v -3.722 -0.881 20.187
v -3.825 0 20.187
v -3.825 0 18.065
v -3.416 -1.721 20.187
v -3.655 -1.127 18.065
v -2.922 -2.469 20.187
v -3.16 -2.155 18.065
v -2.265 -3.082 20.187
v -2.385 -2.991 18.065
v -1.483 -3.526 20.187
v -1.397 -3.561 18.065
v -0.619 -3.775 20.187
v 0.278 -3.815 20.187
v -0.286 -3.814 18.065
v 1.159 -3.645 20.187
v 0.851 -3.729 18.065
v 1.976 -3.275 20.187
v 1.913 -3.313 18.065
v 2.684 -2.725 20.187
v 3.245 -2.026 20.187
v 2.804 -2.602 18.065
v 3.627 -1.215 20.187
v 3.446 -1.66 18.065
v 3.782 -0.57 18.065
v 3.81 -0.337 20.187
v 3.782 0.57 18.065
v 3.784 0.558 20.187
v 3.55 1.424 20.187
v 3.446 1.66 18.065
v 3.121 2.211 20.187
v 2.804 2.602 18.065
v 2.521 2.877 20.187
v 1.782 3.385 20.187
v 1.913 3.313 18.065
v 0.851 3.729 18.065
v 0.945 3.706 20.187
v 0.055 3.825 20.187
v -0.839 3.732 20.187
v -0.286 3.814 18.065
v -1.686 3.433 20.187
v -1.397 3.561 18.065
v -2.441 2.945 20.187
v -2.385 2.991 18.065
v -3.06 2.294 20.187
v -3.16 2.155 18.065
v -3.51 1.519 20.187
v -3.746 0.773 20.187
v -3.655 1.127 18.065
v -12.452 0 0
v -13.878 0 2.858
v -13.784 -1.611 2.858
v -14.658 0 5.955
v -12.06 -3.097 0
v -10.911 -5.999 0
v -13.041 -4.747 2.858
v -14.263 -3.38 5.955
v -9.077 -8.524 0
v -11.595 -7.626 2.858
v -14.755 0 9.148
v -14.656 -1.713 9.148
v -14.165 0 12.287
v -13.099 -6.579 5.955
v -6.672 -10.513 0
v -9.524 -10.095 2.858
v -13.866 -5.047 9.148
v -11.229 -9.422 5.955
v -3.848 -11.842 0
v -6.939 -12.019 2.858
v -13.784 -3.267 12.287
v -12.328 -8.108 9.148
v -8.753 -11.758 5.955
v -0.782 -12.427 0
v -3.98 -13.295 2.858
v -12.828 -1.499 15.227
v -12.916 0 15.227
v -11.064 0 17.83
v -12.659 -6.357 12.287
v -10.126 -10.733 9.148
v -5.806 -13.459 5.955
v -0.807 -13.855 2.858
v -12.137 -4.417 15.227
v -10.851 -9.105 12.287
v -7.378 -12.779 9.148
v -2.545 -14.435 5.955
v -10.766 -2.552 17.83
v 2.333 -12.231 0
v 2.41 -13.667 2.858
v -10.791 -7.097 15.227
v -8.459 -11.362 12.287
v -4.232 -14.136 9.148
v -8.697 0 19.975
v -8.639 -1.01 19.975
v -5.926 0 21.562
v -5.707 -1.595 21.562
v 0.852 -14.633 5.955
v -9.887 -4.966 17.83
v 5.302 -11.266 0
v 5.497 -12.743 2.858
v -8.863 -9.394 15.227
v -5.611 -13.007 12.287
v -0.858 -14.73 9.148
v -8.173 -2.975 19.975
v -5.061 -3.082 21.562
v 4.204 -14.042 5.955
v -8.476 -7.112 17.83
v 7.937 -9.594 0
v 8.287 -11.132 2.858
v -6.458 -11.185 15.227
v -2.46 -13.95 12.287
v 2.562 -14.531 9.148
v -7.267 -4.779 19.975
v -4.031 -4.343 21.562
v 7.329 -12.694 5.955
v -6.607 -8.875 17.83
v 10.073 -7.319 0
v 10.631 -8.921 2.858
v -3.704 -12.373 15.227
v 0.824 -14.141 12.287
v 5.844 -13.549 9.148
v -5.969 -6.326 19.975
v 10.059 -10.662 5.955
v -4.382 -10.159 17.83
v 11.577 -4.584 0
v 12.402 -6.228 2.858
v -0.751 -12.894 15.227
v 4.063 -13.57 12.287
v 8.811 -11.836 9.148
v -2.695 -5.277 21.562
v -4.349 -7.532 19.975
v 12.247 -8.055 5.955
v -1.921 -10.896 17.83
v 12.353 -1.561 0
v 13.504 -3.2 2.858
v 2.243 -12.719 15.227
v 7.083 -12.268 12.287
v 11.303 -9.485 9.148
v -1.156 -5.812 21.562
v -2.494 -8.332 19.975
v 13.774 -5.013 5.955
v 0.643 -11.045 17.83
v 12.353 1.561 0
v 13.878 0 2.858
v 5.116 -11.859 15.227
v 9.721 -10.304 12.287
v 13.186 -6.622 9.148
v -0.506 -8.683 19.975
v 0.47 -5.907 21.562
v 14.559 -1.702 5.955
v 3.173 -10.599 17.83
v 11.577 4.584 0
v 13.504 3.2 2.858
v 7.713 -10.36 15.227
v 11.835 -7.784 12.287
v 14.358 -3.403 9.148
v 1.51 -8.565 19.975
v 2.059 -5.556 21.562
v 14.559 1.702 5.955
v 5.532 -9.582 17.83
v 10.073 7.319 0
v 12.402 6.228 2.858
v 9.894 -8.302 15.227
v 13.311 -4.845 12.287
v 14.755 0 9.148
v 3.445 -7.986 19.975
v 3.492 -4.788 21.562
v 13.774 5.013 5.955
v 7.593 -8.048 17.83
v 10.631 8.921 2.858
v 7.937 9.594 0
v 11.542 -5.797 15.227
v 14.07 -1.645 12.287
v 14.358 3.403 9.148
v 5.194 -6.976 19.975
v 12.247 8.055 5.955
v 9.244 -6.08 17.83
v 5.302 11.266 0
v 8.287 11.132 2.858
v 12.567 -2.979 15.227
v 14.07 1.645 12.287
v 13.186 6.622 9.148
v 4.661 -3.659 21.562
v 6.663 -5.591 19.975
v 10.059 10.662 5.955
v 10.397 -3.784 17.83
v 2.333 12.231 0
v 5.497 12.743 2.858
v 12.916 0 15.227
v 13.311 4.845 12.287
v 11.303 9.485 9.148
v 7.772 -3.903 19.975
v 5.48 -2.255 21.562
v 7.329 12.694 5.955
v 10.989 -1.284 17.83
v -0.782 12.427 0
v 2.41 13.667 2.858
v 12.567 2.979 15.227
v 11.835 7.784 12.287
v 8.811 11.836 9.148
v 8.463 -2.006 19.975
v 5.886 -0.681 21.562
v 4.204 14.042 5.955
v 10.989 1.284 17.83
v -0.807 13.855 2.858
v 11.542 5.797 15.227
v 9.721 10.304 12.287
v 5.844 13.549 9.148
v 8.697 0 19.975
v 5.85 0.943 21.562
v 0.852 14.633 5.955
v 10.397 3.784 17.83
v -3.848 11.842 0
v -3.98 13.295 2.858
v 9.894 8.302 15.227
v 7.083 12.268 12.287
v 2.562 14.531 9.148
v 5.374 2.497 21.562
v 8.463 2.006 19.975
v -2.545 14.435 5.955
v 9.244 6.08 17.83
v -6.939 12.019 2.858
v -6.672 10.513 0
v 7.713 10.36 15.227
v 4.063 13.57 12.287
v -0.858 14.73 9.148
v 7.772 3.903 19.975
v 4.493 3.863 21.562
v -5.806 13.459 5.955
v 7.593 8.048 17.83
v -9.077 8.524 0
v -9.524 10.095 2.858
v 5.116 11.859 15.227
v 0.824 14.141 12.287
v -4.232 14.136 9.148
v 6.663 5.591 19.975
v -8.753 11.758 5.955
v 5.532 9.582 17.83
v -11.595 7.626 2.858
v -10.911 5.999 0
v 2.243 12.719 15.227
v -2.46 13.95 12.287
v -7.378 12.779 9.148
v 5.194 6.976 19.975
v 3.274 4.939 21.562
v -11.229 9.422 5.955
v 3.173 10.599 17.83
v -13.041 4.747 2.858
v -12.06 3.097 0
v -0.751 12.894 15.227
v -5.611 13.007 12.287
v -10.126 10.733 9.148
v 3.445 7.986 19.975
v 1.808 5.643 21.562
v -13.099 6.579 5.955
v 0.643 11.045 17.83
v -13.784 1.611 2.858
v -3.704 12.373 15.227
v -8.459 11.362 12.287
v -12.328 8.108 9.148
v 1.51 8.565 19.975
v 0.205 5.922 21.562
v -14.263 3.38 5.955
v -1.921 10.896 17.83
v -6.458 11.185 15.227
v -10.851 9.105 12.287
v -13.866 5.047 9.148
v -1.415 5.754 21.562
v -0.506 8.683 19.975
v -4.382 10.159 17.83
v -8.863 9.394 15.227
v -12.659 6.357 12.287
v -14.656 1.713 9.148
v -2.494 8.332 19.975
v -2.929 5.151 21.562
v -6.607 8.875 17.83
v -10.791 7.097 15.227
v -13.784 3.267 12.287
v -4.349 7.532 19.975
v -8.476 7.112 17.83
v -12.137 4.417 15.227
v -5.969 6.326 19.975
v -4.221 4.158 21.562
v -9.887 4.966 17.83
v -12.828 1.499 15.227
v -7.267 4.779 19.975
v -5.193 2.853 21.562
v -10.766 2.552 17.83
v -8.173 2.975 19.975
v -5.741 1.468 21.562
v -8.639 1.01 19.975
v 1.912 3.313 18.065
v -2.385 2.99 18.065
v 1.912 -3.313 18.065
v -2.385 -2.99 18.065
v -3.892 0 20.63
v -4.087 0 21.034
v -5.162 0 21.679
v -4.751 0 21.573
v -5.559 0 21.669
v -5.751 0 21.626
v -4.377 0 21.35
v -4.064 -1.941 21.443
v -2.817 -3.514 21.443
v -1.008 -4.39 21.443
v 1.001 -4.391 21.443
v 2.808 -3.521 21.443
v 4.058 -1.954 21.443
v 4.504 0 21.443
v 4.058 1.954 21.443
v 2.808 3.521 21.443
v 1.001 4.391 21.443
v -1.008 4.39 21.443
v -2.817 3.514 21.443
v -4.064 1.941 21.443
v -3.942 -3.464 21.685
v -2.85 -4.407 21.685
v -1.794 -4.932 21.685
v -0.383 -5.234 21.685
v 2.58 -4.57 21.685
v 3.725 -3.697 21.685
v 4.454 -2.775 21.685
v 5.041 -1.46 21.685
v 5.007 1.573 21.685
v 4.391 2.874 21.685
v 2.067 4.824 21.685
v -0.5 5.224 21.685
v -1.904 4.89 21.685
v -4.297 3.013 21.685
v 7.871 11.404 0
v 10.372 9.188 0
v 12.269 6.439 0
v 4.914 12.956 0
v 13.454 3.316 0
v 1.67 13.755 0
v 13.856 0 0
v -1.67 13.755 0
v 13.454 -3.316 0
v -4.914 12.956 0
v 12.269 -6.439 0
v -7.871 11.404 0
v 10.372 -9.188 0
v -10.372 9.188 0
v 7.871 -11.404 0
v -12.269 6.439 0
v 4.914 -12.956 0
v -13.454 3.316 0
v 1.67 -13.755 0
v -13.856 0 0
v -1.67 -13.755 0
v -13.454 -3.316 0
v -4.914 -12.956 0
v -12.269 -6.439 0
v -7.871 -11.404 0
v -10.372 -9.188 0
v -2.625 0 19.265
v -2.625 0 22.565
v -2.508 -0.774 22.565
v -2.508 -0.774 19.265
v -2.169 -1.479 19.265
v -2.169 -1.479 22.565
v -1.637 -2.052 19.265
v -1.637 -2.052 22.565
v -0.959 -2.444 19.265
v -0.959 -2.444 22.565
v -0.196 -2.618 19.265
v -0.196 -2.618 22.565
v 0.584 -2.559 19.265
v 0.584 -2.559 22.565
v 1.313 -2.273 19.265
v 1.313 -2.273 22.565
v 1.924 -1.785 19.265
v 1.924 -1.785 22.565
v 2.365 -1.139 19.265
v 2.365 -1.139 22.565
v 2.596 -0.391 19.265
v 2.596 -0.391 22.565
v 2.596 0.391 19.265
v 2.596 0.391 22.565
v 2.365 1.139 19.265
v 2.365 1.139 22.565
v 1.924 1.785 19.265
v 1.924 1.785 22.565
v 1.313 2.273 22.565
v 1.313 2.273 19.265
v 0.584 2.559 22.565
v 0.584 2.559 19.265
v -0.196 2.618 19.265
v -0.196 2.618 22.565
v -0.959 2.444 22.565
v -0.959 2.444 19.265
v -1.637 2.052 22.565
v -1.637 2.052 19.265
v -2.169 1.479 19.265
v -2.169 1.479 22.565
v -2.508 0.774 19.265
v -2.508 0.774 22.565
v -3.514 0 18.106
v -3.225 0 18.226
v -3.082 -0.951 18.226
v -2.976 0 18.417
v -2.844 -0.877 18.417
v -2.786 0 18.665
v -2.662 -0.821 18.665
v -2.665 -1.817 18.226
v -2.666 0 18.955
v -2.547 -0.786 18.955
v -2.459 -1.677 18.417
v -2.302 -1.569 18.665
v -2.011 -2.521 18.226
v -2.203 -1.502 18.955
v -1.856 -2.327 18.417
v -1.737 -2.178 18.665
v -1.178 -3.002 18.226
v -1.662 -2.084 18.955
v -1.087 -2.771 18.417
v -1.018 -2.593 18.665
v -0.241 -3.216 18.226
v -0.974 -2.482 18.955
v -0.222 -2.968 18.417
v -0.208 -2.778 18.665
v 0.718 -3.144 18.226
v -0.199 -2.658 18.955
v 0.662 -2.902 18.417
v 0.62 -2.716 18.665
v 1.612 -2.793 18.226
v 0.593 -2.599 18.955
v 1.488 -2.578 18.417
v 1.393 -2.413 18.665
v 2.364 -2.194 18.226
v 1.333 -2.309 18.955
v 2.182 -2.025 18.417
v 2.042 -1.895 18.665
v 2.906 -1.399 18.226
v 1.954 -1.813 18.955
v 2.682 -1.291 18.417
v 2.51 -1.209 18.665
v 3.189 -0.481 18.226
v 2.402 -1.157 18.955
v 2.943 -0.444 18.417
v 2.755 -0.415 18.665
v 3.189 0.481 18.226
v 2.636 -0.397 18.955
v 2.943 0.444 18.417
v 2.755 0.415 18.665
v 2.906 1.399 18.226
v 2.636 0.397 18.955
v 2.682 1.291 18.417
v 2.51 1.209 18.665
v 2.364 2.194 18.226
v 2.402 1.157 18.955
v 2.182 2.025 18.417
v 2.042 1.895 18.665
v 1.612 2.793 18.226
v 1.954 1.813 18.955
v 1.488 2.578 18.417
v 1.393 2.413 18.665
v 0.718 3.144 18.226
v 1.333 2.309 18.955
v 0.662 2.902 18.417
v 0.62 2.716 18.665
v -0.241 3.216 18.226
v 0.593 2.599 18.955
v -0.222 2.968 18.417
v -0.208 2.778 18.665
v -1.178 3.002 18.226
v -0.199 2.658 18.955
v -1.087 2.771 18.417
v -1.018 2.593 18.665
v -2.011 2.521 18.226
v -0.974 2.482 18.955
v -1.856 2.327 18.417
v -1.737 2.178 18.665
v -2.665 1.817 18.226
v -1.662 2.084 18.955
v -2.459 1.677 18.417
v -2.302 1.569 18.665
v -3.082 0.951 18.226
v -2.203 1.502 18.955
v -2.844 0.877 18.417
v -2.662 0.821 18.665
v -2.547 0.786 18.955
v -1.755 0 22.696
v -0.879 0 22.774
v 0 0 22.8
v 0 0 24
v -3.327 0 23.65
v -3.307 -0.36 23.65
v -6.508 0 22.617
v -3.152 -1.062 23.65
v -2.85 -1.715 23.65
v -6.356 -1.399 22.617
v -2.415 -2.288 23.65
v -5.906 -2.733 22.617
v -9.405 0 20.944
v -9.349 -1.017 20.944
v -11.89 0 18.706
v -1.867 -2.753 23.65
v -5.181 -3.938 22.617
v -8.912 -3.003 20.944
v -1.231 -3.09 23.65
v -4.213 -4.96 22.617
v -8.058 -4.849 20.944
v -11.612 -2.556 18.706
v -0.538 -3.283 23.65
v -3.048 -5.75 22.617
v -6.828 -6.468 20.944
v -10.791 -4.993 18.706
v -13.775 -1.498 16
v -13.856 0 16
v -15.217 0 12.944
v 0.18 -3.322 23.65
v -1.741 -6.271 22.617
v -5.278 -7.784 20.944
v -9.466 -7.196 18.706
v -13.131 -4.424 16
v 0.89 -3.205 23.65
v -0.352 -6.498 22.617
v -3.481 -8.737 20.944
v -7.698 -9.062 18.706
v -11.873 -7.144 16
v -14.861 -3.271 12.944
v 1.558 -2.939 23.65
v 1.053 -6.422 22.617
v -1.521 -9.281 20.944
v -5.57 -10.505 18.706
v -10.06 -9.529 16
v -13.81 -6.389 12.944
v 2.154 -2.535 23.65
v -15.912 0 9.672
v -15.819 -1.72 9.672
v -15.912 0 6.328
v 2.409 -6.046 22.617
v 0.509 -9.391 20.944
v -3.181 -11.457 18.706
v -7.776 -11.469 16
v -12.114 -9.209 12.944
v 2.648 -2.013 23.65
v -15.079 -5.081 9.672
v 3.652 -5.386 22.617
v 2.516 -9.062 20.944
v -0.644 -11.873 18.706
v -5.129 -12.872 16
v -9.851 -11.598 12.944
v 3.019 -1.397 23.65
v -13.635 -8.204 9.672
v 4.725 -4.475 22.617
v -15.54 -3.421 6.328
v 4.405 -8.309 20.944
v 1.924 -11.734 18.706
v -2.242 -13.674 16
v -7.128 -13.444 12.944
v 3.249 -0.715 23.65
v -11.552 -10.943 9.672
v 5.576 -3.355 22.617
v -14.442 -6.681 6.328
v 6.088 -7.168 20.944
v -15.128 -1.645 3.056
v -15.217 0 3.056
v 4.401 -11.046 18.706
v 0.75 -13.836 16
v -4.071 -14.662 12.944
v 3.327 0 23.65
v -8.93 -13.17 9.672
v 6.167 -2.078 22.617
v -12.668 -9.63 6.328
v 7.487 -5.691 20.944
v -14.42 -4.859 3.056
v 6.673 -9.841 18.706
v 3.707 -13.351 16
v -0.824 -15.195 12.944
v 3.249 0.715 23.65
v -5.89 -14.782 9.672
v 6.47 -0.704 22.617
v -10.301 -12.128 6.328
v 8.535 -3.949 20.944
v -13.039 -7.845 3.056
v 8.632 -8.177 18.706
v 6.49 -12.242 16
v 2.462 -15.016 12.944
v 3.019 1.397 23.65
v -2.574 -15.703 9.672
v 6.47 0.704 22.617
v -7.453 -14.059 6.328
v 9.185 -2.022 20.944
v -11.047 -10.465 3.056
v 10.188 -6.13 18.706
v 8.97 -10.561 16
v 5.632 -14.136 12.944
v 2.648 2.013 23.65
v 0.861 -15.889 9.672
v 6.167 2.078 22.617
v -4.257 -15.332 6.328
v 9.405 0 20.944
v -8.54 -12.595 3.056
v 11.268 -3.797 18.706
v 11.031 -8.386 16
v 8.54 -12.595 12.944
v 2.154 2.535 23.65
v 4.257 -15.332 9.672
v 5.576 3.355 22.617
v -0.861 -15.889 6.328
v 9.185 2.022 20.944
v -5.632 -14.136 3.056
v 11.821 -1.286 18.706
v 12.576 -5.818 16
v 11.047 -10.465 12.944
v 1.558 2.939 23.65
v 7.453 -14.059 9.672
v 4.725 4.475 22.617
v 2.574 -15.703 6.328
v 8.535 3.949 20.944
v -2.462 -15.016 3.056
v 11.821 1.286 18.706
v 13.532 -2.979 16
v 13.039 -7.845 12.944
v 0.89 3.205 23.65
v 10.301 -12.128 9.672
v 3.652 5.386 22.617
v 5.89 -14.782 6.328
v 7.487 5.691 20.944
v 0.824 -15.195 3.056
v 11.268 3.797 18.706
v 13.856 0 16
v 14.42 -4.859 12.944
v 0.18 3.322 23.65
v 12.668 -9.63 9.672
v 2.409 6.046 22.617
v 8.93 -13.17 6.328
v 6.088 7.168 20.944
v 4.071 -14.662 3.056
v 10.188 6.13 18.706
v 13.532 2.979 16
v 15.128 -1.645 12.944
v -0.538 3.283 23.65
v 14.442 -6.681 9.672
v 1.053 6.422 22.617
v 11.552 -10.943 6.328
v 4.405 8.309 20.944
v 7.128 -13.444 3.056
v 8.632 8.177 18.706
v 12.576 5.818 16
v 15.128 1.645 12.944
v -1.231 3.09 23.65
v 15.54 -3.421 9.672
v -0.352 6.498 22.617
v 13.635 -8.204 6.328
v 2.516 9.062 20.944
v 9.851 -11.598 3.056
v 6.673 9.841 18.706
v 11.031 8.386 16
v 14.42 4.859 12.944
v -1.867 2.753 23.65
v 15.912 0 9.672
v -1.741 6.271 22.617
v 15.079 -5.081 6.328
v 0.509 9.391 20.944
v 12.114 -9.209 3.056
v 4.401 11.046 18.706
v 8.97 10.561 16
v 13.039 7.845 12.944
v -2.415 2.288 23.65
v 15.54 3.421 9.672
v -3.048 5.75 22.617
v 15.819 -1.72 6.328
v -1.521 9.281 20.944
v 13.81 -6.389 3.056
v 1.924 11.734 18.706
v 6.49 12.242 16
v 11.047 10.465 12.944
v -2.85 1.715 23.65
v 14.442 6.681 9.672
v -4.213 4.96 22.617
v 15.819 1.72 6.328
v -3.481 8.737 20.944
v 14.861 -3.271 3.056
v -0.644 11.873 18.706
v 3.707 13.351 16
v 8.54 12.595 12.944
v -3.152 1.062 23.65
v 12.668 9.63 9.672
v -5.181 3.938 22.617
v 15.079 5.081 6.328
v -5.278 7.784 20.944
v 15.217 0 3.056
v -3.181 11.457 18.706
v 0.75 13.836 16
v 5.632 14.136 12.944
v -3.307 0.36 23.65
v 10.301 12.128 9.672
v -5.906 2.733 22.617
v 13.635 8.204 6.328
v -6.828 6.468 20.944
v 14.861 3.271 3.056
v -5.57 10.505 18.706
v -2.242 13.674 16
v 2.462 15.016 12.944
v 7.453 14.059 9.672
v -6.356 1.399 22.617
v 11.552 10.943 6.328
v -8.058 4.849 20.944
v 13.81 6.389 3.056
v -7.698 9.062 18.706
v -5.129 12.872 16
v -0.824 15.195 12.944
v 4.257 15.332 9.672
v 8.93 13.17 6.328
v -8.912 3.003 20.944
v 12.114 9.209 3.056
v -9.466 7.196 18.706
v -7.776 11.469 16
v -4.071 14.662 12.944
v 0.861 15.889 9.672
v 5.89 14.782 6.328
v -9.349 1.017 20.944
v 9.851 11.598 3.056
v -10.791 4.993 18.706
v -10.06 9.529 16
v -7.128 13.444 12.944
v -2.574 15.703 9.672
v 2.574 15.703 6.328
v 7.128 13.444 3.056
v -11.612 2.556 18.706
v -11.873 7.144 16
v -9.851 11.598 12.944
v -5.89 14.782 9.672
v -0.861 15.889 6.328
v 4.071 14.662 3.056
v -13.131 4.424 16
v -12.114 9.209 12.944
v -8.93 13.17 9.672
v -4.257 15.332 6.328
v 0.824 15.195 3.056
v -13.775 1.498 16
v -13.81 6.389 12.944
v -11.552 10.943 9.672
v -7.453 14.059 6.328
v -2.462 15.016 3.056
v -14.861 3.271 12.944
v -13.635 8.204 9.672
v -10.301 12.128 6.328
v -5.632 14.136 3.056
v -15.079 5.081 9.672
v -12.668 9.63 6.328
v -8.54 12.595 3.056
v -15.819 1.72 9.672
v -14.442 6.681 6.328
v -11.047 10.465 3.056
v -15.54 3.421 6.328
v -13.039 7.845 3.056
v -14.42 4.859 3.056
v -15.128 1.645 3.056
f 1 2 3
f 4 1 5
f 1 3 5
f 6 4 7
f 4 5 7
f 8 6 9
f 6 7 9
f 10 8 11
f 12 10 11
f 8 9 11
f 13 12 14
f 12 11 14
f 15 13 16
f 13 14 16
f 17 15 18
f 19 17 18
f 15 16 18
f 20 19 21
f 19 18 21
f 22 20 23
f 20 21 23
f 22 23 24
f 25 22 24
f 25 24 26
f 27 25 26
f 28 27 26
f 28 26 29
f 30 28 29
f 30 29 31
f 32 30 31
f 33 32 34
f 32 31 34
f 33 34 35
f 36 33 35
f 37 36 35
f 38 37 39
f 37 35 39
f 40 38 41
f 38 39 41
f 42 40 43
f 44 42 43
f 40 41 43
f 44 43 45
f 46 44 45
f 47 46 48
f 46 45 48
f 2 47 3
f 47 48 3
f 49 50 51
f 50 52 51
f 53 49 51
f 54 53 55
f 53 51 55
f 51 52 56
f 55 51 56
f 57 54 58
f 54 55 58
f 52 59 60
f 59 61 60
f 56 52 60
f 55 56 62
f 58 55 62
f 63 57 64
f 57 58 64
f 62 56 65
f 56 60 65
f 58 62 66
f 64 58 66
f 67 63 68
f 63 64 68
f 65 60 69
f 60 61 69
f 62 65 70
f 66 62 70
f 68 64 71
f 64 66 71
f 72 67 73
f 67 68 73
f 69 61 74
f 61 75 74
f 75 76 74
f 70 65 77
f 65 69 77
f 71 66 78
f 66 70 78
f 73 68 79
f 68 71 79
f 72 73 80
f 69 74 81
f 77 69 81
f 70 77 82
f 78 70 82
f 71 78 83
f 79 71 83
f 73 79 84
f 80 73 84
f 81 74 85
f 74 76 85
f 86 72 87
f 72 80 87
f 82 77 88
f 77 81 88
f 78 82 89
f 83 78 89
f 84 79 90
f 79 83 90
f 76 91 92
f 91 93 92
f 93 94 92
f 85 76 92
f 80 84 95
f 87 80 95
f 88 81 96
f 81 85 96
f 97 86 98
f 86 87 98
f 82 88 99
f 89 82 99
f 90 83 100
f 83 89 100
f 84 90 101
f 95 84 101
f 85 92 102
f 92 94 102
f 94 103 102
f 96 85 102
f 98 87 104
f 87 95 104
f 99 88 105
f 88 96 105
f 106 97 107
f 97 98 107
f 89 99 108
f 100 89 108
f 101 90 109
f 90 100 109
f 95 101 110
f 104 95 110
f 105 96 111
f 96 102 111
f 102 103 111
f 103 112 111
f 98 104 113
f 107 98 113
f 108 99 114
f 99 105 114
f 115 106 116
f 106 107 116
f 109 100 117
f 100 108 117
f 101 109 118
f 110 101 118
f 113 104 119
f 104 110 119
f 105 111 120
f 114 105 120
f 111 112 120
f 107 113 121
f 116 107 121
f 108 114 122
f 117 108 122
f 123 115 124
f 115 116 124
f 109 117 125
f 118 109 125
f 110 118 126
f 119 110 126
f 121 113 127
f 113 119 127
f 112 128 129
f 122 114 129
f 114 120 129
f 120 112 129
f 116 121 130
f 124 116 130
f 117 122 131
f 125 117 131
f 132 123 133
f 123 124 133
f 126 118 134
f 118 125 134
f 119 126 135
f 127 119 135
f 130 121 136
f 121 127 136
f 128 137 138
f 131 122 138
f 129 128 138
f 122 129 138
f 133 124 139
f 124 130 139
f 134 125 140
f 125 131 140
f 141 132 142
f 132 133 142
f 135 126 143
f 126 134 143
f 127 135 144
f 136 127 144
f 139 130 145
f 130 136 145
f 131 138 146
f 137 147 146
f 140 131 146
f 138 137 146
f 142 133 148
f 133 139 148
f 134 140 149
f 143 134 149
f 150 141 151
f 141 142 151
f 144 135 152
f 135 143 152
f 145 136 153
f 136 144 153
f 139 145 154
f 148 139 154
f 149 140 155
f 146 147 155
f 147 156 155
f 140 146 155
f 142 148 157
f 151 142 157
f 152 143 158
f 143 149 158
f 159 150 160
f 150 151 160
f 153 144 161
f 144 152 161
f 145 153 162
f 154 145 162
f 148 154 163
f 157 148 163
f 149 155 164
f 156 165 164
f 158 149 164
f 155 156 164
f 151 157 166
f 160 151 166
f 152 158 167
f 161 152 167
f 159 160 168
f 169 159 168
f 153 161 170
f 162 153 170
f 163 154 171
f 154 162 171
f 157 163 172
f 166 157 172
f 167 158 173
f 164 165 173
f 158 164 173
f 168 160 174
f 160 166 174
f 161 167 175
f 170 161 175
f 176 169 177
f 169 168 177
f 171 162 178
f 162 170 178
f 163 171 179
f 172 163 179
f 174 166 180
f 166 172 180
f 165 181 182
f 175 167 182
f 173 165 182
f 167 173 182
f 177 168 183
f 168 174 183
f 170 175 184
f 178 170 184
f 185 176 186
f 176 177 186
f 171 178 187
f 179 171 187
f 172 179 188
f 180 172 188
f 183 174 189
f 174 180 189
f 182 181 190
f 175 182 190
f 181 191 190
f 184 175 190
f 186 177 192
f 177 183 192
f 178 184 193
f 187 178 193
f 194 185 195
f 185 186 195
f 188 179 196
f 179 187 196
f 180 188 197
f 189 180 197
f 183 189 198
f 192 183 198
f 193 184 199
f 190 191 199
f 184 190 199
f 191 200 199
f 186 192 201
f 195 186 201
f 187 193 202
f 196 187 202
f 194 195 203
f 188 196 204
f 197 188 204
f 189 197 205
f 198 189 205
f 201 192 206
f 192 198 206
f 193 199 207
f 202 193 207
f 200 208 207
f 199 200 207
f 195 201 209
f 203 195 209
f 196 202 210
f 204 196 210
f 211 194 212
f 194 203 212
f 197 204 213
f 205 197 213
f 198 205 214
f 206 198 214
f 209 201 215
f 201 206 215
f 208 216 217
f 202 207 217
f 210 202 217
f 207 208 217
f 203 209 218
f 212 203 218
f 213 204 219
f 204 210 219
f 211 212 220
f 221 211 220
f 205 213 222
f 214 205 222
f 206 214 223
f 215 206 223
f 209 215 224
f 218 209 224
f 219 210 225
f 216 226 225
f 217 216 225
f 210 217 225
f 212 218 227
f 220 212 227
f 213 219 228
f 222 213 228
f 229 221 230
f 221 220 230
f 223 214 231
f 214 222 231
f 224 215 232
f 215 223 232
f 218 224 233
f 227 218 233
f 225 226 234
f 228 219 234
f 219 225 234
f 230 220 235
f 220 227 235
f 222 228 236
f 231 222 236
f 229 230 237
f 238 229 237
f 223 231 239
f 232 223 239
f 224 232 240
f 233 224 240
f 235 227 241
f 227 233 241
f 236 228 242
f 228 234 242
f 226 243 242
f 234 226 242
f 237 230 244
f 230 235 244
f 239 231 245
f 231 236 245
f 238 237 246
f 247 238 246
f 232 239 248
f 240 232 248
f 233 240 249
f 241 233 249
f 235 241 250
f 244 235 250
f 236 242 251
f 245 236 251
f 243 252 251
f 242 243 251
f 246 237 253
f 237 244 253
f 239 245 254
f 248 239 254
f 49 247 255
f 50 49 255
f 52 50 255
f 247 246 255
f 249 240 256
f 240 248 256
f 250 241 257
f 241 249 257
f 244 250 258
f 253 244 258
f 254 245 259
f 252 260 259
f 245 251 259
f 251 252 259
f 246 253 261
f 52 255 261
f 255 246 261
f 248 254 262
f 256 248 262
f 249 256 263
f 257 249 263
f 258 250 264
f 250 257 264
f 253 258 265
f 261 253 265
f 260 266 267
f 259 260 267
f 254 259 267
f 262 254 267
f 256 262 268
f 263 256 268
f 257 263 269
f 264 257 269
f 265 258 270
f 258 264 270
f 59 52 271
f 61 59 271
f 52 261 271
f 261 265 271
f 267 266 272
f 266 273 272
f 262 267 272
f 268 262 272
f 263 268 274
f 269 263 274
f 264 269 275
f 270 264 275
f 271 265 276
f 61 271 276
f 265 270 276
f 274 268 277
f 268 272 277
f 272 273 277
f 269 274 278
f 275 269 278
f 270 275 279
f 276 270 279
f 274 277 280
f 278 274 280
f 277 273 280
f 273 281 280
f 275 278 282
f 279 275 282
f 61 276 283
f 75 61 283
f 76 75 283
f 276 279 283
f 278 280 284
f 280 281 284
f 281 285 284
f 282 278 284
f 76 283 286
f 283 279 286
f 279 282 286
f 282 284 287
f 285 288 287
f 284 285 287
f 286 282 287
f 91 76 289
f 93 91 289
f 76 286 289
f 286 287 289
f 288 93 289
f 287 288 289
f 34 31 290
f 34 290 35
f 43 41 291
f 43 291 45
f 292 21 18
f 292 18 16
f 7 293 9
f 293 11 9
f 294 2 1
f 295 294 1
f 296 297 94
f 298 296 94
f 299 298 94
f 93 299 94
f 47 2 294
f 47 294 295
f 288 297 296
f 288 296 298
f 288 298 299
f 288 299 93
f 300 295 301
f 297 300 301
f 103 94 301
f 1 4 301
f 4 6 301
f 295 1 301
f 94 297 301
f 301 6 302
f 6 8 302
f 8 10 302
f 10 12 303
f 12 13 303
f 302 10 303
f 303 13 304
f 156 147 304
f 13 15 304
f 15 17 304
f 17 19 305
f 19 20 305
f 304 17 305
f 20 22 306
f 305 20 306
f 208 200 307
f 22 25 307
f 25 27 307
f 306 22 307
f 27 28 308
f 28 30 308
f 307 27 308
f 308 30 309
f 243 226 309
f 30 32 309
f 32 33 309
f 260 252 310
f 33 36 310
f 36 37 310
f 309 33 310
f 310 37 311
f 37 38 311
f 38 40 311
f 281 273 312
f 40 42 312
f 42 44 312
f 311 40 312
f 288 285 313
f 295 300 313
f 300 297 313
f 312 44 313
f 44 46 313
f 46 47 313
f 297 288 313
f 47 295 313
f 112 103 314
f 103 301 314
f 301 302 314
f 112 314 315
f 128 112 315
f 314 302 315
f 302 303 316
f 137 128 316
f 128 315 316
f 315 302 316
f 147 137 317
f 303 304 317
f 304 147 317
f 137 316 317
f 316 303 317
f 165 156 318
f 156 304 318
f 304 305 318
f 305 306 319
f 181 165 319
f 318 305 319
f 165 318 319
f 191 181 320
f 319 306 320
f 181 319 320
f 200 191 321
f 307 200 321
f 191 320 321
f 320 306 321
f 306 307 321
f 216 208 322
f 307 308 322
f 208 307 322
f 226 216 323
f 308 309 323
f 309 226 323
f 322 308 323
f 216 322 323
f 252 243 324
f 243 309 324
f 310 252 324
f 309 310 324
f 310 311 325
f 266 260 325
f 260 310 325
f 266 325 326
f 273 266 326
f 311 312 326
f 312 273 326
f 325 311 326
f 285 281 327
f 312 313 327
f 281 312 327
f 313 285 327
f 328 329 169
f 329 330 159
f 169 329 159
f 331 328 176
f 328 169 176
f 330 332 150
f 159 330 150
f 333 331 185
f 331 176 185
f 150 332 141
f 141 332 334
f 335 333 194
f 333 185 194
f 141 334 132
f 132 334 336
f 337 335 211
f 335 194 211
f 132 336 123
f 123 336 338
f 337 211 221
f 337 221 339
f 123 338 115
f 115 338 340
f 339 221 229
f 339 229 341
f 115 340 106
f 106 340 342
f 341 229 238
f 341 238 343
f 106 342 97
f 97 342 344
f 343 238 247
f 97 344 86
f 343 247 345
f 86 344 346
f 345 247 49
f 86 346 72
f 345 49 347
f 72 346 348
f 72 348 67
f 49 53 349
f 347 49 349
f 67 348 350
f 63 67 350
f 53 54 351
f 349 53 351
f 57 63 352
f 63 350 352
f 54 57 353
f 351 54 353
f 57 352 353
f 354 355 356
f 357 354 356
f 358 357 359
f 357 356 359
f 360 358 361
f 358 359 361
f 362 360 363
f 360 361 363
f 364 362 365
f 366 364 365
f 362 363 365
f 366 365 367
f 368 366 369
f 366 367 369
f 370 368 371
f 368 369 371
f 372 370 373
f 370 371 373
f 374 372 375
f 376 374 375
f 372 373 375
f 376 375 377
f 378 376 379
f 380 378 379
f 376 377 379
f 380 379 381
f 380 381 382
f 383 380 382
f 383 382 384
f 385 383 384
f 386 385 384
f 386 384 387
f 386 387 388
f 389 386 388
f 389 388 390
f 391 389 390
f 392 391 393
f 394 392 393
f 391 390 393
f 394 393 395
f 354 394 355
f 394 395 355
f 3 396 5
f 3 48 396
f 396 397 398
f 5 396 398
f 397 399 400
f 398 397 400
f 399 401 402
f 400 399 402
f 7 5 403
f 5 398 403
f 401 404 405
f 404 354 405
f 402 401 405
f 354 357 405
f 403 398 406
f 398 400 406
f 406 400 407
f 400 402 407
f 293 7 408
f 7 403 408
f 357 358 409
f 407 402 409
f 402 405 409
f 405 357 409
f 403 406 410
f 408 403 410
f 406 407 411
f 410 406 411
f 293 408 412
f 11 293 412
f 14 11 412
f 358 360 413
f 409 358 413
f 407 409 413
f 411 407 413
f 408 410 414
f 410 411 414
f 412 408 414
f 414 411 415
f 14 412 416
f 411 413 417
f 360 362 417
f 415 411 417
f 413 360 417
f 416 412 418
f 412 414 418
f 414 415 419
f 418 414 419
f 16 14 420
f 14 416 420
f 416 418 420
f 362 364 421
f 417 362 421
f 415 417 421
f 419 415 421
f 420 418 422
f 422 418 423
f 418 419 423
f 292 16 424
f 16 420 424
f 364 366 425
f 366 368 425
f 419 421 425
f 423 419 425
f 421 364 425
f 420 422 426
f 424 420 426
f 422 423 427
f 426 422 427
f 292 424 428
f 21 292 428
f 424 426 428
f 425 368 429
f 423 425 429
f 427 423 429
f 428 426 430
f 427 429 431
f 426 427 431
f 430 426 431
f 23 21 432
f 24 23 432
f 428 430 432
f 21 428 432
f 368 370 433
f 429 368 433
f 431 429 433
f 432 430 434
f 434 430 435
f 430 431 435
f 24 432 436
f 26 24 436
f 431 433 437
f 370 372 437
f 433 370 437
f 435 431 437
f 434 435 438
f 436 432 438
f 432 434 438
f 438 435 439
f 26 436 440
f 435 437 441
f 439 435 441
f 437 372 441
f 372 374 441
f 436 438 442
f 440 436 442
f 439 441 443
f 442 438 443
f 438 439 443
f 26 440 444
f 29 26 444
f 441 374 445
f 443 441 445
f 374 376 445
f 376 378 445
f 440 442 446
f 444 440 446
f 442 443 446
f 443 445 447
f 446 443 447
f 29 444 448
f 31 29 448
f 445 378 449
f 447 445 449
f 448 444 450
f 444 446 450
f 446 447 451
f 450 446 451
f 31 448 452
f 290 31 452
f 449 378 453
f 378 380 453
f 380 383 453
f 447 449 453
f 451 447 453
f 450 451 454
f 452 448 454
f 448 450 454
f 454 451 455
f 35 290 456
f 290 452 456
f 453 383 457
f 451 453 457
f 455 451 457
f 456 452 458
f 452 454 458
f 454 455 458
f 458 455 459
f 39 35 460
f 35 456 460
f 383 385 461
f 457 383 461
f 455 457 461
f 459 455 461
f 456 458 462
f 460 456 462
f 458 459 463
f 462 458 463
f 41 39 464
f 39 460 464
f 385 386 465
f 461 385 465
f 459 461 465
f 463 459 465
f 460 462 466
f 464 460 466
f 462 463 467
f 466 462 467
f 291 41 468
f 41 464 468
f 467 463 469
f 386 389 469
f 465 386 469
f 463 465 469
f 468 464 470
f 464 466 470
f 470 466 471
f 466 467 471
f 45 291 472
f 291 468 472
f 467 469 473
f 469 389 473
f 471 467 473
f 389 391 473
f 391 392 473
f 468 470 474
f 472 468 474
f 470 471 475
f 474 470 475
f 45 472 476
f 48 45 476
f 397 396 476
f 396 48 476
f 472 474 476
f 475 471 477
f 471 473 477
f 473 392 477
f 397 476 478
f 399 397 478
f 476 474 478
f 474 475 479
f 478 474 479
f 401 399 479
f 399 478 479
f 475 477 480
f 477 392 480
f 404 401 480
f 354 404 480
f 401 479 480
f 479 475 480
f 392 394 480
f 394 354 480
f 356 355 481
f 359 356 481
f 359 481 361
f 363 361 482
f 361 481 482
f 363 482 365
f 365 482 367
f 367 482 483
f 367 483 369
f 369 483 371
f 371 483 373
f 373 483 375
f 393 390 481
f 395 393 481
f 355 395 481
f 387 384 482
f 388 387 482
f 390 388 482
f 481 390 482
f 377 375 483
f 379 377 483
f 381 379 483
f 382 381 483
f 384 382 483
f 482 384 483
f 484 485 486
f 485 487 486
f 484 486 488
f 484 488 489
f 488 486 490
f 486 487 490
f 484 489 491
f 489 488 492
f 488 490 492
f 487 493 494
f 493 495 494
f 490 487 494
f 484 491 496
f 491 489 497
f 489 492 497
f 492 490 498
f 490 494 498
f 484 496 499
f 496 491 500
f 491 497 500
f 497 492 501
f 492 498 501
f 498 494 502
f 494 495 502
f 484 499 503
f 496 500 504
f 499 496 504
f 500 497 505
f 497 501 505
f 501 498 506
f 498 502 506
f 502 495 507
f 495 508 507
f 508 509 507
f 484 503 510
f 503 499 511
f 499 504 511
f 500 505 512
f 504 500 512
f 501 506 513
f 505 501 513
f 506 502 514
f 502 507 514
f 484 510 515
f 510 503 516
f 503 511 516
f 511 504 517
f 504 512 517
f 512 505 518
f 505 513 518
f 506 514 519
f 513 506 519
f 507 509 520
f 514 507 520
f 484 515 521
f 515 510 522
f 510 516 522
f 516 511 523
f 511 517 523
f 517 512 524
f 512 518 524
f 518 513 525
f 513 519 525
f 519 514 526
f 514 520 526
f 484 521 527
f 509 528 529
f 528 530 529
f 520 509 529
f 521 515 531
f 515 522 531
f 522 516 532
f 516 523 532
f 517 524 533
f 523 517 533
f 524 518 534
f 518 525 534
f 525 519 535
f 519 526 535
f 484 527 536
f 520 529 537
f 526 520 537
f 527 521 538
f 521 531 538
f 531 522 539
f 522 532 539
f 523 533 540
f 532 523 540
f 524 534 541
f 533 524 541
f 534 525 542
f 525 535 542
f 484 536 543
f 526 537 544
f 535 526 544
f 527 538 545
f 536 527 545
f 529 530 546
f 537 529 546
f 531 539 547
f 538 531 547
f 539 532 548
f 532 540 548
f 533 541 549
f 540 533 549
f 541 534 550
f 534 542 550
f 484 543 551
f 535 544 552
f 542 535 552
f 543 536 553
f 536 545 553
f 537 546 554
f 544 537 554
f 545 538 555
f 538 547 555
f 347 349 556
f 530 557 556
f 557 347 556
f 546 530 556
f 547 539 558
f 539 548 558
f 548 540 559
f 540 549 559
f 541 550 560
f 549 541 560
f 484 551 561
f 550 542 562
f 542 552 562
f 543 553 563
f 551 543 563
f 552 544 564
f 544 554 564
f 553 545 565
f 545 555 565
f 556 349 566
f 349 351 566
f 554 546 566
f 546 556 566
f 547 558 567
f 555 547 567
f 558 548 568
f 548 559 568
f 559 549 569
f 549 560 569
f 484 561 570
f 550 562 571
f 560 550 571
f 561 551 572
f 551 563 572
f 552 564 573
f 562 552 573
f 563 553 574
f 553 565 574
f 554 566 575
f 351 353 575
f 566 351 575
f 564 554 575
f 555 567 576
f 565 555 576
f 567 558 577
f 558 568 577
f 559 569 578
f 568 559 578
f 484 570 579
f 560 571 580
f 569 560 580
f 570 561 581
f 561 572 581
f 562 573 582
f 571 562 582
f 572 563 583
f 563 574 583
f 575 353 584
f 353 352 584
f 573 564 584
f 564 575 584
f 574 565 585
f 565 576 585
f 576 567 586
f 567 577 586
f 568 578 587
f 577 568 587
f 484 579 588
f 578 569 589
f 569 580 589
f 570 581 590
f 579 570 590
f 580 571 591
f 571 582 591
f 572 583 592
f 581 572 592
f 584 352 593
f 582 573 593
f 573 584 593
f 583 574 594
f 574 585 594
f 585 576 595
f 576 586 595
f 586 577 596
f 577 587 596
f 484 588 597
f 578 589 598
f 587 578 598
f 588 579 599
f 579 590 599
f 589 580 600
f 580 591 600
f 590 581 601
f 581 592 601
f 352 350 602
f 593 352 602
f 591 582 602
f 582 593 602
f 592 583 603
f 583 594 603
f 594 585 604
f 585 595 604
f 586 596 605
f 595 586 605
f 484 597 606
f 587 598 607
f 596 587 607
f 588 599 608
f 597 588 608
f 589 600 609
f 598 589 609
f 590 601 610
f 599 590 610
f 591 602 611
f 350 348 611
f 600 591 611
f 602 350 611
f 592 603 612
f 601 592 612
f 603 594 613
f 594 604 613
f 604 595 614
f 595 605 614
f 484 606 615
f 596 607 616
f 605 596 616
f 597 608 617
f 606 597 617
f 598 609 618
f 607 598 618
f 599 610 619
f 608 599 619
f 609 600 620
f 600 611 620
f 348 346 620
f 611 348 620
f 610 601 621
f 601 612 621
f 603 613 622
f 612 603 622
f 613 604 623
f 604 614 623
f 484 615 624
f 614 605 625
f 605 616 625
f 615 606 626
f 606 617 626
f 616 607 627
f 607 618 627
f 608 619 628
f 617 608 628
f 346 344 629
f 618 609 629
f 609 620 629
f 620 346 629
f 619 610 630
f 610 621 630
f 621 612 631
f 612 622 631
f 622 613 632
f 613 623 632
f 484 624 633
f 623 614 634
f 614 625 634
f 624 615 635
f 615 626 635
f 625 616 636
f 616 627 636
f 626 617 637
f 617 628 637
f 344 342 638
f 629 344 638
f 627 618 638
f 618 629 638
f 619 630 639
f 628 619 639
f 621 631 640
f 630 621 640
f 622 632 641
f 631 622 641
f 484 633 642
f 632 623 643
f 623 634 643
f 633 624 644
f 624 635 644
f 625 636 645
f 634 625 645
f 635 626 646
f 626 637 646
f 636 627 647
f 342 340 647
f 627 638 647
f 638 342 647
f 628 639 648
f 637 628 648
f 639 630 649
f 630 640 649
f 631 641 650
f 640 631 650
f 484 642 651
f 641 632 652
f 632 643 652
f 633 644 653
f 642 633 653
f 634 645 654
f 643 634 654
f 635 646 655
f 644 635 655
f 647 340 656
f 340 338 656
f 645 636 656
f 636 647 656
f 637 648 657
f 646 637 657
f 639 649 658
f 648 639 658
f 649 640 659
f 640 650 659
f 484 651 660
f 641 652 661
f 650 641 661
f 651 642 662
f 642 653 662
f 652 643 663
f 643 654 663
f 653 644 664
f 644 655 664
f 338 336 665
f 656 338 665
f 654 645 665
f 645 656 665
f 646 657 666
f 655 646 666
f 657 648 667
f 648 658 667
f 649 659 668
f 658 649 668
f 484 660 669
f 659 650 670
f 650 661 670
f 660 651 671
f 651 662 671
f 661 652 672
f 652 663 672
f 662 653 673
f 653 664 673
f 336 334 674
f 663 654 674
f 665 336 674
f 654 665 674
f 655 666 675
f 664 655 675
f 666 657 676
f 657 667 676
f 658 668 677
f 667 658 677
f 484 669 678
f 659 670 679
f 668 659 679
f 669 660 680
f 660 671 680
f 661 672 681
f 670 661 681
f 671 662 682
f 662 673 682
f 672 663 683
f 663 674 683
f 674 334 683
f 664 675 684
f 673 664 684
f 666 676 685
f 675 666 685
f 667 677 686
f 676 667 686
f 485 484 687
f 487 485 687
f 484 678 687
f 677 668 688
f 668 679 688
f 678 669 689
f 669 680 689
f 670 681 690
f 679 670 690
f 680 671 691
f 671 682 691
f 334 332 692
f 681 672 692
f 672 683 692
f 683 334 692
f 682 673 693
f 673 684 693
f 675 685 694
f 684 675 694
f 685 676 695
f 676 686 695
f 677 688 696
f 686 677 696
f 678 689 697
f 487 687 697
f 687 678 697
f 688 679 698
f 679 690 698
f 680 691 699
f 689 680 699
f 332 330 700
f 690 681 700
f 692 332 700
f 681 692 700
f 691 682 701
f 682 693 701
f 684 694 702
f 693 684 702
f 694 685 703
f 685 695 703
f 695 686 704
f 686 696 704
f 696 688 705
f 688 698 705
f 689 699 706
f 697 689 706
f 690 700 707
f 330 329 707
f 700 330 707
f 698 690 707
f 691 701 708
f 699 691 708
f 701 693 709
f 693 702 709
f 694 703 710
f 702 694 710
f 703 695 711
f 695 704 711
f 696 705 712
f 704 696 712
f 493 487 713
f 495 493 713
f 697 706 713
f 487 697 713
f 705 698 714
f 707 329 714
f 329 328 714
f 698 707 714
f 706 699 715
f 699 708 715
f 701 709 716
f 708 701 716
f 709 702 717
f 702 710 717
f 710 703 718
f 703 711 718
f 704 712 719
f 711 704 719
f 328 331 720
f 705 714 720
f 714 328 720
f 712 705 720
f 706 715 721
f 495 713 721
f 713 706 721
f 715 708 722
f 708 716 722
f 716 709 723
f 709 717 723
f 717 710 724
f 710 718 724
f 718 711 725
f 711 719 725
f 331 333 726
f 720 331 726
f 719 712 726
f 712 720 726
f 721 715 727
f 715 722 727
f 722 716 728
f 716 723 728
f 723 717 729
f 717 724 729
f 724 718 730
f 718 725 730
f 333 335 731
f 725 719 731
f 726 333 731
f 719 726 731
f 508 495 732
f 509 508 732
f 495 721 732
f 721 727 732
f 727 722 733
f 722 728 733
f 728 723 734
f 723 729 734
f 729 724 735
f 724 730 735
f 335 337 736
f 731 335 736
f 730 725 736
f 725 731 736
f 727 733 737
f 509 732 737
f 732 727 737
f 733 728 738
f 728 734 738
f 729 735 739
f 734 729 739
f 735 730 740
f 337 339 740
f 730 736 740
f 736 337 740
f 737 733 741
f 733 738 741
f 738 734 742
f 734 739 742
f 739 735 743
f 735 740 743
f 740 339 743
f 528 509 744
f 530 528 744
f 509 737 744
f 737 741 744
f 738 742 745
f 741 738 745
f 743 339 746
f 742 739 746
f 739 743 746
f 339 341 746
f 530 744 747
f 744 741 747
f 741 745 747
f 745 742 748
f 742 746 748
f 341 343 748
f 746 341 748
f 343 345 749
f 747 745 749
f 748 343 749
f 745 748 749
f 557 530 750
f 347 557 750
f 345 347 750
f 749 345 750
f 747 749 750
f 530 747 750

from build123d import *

# Parameters (mm, degrees)
F2_R = 1.19999
F3_R = 1.5


# Not quite as in the source:
# - a fillet or chamfer is up to 0.001 mm smaller than in the source, because OpenCascade refuses the exact size


with BuildPart() as f1:
    # F0 (on Front) → F1 (revolve)
    with BuildSketch(Plane.XZ):
        with BuildLine():
            Line((0, 22.8), (0, 24))
            ThreePointArc((0, 24), (-13.8564064606, 16), (-13.8564064606, 0))
            Line((-13.8564064606, 0), (-12.451505933, 0))
            ThreePointArc((-12.451505933, 0), (-13.8029789452, 13.3402033893), (-3.825, 22.2971806661))
            ThreePointArc((-3.825, 22.2971806661), (-3.227786159, 22.4437320839), (-2.625, 22.5653484339))
            ThreePointArc((-2.625, 22.5653484339), (-1.3177335047, 22.741220384), (0, 22.8))
        make_face()
        with BuildLine():
            Line((-2.625, 18.0653484339), (-2.625, 22.5653484339))
            ThreePointArc((-2.625, 22.5653484339), (-3.227786159, 22.4437320839), (-3.825, 22.2971806661))
            Line((-3.825, 22.2971806661), (-3.825, 18.0653484339))
            Line((-3.825, 18.0653484339), (-2.625, 18.0653484339))
        make_face()
    revolve(axis=Axis((0, 0, 23.4), (0, 0, 1)))

    # F2 (radius 1.2 in the source; OpenCascade refuses exactly that, so slightly less here)
    f2_edges = [f1.edges().sort_by_distance(p)[0] for p in [
        (2.625, 0, 18.065348),
    ]]
    fillet(f2_edges, radius=F2_R)

    # F3
    f3_edges = [f1.edges().sort_by_distance(p)[0] for p in [
        (3.825, 0, 22.297181),
    ]]
    fillet(f3_edges, radius=F3_R)


solid = f1.part
